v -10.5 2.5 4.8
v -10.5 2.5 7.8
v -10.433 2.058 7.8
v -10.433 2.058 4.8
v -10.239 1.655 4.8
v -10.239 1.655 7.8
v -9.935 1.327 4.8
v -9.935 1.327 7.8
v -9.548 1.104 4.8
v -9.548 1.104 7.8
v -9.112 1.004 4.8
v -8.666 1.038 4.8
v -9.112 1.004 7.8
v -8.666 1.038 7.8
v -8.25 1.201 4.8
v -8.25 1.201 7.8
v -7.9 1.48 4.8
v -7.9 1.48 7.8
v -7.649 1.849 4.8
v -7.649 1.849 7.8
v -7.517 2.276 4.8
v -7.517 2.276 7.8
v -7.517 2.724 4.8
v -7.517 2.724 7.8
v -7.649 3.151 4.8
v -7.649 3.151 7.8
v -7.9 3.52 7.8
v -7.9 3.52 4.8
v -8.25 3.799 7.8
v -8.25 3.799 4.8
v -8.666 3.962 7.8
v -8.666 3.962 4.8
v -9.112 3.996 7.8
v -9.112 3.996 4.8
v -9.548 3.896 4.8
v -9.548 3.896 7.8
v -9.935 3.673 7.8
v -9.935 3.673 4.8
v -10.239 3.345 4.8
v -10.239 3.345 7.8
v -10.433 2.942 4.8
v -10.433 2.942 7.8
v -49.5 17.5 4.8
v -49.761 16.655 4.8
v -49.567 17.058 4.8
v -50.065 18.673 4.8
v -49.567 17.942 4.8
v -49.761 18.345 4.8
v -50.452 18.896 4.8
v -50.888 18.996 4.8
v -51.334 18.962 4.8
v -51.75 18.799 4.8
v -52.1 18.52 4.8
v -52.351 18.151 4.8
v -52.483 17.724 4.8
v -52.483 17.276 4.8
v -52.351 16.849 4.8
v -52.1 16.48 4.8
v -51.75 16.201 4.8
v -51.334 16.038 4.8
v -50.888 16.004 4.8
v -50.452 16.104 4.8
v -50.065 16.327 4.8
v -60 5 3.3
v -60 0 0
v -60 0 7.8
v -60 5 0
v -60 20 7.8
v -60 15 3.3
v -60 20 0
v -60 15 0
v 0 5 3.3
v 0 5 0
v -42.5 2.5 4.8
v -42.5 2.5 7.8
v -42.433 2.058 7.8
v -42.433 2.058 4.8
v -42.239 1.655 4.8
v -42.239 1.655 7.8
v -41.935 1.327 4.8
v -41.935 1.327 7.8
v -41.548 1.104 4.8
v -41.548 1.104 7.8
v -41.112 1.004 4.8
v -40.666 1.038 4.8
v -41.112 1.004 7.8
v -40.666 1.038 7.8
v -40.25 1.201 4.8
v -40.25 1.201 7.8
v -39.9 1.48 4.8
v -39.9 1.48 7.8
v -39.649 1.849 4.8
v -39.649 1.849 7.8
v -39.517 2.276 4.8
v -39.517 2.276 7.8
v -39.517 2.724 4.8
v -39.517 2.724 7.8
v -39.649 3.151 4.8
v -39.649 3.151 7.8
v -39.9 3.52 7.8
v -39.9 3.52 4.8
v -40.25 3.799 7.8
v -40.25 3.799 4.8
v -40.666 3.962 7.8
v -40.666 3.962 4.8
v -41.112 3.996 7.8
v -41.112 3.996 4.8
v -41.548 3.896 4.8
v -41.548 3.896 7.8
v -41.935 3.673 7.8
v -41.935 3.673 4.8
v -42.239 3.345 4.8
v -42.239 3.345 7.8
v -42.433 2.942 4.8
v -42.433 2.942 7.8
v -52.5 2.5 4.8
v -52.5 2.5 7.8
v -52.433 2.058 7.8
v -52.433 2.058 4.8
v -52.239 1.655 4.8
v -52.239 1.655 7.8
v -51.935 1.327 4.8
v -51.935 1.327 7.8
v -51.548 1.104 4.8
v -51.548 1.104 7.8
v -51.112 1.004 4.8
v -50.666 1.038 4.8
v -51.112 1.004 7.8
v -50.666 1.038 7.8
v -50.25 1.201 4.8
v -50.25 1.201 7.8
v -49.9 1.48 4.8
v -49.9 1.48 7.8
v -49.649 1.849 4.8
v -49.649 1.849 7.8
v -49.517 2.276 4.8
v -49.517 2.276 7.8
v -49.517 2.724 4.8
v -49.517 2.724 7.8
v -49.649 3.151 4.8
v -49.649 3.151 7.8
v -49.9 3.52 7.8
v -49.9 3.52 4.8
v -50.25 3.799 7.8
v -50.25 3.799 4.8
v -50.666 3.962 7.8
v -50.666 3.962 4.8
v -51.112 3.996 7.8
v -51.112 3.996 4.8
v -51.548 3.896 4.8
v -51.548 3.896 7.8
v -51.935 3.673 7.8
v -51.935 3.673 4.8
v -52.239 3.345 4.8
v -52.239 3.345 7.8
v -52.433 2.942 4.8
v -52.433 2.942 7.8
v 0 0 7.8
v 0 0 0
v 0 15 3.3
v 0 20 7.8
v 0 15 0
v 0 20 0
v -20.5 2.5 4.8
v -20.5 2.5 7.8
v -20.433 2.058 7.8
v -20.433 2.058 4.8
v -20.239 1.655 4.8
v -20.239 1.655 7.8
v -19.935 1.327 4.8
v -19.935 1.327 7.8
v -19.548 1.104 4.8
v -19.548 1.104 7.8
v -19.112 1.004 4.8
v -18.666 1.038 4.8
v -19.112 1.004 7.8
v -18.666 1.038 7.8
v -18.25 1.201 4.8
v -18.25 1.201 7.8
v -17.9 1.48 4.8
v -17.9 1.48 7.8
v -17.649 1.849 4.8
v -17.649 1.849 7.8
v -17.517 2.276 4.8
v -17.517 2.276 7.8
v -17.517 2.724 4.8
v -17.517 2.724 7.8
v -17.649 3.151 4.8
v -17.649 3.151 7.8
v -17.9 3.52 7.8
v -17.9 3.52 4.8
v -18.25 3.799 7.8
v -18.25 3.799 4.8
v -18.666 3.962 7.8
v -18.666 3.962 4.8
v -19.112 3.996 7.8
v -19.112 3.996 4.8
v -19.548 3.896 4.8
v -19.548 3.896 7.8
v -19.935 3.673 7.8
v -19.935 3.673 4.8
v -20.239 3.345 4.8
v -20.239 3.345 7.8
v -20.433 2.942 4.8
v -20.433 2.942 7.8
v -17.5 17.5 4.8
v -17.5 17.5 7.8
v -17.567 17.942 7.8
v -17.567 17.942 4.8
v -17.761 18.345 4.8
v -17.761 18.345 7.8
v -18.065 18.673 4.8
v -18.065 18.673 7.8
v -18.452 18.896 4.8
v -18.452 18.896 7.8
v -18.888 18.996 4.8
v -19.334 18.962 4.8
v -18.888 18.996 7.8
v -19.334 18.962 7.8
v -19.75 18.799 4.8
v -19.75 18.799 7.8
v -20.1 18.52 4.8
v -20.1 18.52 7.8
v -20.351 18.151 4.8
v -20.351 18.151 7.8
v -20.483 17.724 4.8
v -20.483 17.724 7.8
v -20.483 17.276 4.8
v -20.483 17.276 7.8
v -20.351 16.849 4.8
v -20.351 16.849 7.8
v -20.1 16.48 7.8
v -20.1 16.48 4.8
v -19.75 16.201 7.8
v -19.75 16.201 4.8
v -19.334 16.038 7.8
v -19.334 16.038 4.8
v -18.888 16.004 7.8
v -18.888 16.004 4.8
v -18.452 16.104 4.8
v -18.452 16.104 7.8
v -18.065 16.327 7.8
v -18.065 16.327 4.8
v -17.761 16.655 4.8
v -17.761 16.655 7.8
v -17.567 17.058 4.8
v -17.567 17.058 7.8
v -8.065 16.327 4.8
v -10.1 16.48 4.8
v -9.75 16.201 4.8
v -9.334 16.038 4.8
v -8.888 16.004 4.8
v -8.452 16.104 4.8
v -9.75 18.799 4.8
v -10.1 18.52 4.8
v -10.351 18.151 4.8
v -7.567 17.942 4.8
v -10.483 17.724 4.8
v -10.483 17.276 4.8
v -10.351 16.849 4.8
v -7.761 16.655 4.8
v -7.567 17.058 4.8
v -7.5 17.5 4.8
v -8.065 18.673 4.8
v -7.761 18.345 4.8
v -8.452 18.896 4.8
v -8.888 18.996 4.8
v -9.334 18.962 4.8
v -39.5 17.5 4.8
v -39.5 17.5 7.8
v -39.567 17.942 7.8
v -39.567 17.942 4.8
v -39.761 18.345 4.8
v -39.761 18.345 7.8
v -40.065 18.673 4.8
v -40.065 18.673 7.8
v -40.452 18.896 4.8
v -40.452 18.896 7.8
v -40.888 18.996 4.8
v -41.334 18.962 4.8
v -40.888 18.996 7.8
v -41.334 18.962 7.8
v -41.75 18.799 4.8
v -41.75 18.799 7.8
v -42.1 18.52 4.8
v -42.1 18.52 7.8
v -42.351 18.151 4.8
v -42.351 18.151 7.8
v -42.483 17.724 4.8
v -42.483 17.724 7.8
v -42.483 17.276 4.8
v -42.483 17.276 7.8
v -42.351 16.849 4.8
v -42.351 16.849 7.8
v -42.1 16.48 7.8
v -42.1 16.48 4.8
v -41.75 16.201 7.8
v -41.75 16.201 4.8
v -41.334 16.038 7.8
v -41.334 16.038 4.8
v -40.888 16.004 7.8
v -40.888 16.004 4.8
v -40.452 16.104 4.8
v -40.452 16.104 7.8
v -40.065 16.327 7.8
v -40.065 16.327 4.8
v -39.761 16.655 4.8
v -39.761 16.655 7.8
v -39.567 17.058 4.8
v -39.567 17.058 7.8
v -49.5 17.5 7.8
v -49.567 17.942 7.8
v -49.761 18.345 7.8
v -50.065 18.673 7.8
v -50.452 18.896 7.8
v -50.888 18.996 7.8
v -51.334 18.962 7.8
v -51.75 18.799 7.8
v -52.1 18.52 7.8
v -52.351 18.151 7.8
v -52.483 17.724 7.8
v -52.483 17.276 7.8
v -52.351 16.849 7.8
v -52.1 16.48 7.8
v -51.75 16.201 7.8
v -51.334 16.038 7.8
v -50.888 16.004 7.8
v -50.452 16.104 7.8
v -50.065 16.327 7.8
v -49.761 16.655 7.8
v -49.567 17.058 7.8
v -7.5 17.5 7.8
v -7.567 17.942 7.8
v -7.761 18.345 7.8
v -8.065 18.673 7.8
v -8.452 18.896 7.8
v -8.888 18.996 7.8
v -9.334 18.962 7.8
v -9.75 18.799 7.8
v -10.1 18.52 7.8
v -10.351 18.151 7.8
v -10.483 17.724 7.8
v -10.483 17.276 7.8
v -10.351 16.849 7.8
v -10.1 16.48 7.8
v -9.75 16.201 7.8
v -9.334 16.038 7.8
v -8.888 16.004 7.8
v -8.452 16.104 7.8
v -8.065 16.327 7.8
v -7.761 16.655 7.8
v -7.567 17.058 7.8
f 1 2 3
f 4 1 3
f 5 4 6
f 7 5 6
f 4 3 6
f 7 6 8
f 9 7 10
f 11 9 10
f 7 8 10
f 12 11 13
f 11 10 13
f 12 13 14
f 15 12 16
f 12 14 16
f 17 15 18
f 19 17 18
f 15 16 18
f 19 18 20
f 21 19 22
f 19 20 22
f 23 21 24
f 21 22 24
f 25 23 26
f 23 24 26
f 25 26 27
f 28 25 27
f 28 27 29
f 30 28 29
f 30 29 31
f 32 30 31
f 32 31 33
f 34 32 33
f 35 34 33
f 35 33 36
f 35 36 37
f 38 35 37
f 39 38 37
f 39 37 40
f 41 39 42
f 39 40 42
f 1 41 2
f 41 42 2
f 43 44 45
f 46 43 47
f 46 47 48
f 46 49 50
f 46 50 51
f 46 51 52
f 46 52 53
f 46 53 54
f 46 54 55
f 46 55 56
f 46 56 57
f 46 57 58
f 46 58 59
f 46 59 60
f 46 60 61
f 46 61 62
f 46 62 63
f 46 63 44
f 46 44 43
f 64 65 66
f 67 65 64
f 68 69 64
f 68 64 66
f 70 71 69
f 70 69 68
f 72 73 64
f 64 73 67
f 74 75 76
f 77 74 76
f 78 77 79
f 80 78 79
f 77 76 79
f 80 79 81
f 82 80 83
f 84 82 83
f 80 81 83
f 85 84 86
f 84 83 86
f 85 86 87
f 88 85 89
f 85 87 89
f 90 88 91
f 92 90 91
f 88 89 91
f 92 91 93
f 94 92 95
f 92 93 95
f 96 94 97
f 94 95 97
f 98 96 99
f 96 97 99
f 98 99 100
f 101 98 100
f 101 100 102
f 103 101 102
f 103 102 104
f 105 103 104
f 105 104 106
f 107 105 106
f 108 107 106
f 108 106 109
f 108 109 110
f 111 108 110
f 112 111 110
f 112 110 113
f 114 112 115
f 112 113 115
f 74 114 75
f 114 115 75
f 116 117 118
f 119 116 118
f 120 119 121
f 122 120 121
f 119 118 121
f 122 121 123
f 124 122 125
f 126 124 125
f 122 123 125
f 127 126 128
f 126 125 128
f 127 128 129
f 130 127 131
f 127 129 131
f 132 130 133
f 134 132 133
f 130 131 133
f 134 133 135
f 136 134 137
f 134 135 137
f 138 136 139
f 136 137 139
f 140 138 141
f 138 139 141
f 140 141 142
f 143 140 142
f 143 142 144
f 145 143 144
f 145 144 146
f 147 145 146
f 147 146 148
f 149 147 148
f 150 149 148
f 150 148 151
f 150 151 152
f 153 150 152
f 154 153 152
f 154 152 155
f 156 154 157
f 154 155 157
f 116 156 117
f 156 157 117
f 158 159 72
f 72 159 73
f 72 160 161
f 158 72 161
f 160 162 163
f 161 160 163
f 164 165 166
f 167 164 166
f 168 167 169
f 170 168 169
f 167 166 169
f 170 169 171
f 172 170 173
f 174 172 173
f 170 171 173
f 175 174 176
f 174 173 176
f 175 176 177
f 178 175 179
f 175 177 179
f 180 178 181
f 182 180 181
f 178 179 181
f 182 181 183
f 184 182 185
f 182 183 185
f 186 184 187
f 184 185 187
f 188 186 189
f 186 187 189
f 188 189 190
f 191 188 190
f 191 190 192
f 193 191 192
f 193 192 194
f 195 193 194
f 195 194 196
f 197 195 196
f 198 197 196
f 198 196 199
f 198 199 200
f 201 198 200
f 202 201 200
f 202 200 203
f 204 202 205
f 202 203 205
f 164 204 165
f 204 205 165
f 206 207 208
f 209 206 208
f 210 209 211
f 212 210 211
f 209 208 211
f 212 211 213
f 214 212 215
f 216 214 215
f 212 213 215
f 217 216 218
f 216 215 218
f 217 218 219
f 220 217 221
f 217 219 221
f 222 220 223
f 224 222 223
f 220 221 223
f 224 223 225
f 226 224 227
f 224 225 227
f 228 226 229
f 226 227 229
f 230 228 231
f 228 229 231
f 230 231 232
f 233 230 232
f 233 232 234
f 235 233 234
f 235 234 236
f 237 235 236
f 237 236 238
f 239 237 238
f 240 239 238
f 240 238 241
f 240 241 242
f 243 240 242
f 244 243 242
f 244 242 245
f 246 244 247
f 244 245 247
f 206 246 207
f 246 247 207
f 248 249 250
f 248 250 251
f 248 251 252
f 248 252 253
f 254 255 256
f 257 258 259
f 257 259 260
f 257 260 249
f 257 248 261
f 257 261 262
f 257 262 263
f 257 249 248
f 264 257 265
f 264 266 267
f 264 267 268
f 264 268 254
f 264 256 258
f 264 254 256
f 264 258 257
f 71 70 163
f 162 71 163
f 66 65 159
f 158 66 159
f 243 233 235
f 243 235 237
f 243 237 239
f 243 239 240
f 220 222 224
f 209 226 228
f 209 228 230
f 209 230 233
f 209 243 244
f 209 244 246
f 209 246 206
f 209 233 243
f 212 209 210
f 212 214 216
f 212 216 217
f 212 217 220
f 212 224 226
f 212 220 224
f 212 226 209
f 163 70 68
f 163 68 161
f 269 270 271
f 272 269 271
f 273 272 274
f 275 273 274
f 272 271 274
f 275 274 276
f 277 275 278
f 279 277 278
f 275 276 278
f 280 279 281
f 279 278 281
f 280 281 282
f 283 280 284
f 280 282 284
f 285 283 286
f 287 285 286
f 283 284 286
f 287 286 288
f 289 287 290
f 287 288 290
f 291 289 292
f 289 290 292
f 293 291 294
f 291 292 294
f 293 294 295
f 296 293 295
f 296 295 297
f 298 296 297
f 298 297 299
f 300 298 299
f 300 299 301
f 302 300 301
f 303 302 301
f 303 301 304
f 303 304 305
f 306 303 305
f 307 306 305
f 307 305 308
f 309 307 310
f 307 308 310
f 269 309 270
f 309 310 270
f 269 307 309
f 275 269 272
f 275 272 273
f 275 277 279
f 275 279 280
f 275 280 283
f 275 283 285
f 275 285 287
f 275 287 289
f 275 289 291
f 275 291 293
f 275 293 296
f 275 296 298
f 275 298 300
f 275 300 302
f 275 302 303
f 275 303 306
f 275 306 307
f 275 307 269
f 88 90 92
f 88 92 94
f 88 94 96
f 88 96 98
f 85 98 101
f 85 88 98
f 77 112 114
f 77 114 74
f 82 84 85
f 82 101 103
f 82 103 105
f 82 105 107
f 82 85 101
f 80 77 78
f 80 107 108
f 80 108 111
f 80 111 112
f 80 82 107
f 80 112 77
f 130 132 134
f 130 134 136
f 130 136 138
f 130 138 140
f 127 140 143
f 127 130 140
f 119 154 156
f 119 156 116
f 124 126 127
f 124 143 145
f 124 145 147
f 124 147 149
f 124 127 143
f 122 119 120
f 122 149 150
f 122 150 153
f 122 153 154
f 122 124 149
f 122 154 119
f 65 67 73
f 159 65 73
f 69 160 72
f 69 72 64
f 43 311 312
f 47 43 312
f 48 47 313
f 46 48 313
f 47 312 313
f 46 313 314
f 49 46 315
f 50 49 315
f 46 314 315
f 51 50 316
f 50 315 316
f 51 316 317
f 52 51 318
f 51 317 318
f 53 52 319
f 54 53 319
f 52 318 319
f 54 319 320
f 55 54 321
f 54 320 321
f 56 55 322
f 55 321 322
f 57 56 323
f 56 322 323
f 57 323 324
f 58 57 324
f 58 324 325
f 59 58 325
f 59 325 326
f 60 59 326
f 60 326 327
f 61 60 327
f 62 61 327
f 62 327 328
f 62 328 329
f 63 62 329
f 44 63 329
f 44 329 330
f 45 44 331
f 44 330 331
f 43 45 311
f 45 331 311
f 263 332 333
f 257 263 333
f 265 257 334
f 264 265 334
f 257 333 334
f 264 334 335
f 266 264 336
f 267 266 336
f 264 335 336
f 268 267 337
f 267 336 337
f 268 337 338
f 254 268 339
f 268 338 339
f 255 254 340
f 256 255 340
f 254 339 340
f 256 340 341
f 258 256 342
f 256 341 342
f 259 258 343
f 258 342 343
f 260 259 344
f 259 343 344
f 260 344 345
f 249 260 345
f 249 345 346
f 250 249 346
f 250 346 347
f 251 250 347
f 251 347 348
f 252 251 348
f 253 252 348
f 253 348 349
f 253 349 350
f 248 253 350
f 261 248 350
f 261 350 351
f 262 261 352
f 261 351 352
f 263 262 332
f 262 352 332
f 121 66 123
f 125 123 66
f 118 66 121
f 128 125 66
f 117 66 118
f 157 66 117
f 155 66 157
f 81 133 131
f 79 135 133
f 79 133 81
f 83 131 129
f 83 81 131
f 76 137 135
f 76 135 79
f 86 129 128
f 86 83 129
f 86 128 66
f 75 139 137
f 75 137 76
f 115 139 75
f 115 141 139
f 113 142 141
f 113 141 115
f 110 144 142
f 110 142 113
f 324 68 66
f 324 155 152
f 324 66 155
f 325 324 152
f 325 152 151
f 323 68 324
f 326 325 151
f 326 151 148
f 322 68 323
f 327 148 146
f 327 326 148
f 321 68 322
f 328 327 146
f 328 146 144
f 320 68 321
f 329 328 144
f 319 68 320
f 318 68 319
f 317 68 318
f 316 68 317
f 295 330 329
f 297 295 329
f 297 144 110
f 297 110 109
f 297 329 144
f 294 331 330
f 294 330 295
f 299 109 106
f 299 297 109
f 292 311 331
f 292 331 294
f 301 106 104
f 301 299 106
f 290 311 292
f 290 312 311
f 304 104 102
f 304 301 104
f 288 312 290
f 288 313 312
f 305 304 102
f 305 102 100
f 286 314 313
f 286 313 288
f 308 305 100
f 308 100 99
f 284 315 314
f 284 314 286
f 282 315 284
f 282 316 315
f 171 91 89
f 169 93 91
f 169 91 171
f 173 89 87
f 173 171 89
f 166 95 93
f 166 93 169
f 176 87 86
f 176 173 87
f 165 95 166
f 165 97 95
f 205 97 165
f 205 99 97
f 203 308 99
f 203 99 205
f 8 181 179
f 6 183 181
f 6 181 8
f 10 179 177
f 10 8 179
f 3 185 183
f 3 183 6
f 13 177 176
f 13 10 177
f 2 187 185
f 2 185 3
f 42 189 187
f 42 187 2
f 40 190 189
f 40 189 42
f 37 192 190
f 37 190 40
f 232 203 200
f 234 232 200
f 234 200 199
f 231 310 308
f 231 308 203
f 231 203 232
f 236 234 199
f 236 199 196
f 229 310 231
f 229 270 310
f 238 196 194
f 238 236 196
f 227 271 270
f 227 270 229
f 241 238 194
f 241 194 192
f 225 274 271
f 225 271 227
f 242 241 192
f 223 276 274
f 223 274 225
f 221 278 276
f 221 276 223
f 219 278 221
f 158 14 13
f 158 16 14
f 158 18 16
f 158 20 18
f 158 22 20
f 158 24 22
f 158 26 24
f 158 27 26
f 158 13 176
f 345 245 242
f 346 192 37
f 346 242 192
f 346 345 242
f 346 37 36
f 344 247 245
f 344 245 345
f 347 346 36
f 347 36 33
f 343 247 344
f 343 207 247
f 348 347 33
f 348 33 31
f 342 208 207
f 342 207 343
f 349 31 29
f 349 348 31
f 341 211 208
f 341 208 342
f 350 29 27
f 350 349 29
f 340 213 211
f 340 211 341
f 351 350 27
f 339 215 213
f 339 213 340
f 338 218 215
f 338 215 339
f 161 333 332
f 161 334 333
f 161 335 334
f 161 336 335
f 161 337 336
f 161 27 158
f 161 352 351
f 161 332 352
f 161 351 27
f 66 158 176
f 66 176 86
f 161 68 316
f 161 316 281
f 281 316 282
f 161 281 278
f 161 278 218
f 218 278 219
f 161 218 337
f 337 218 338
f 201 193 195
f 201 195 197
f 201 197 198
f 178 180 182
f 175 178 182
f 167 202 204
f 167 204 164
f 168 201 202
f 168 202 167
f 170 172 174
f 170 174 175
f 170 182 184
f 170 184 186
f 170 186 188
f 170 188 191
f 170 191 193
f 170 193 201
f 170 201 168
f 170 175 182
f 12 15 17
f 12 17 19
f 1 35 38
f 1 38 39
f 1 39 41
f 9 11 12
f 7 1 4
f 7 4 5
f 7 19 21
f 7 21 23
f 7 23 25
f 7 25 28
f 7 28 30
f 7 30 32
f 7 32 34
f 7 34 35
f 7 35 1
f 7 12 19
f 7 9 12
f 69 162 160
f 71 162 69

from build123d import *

# Parameters (mm, degrees)
ESQUISSE1_W             = 60
ESQUISSE1_H             = 20
BOSS_EXTRU_1_DEPTH      = 7.8
ESQUISSE2_W             = 60
ESQUISSE2_H             = 10
ENL_V_MAT_EXTRU_1_DEPTH = 3.3
ESQUISSE4_R             = 1.5
ENL_V_MAT_EXTRU_2_DEPTH = 3


with BuildPart() as part:
    # Esquisse1 → Boss.-Extru.1 (new body)
    with BuildSketch(Plane.XY):
        with Locations((-30, 10)):
            Rectangle(ESQUISSE1_W, ESQUISSE1_H)
    extrude(amount=BOSS_EXTRU_1_DEPTH)

    # Esquisse2 → Enlèv. mat.-Extru.1 (cut)
    with BuildSketch(Plane(origin=(0, 0, 0), x_dir=(-1, 0, 0), z_dir=(0, 0, -1))):
        with Locations((30, 10)):
            Rectangle(ESQUISSE2_W, ESQUISSE2_H)
    extrude(amount=-ENL_V_MAT_EXTRU_1_DEPTH, mode=Mode.SUBTRACT)

    # Esquisse4 → Enlèv. mat.-Extru.2 (cut)
    with BuildSketch(Plane.XY.offset(7.8)):
        with Locations((-51, 17.5)):
            Circle(ESQUISSE4_R)
        with Locations((-41, 17.5)):
            Circle(ESQUISSE4_R)
        with Locations((-19, 17.5)):
            Circle(ESQUISSE4_R)
        with Locations((-9, 17.5)):
            Circle(ESQUISSE4_R)
        with Locations(Location((-9, 2.5, 0), (0, 0, 180))):
            Circle(ESQUISSE4_R)
        with Locations(Location((-19, 2.5, 0), (0, 0, 180))):
            Circle(ESQUISSE4_R)
        with Locations(Location((-41, 2.5, 0), (0, 0, 180))):
            Circle(ESQUISSE4_R)
        with Locations(Location((-51, 2.5, 0), (0, 0, 180))):
            Circle(ESQUISSE4_R)
    extrude(amount=-ENL_V_MAT_EXTRU_2_DEPTH, mode=Mode.SUBTRACT)


solid = part.part
